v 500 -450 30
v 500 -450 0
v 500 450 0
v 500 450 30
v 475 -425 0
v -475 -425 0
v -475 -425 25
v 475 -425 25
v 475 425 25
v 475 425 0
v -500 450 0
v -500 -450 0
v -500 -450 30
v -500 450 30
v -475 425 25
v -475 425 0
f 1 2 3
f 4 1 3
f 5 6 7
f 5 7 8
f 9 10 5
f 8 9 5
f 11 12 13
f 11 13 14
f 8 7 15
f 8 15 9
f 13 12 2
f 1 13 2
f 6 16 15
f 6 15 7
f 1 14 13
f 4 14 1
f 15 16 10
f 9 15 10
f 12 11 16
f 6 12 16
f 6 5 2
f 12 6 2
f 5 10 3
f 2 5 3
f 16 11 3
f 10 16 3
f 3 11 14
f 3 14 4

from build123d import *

# Parameters (mm, degrees)
F0_W     = 1000
F0_H     = 900
F1_DEPTH = 30
F2_W     = 950
F2_H     = 850
F3_DEPTH = 25


with BuildPart() as f1:
    # F0 (on Top) → F1 (new body)
    with BuildSketch(Plane.XY):
        Rectangle(F0_W, F0_H)
    extrude(amount=F1_DEPTH)

    # F2 (on face) → F3 (cut)
    with BuildSketch(Plane(origin=(0, 0, 0), x_dir=(1, 0, 0), z_dir=(0, 0, -1))):
        Rectangle(F2_W, F2_H)
    extrude(amount=-F3_DEPTH, mode=Mode.SUBTRACT)


solid = f1.part
